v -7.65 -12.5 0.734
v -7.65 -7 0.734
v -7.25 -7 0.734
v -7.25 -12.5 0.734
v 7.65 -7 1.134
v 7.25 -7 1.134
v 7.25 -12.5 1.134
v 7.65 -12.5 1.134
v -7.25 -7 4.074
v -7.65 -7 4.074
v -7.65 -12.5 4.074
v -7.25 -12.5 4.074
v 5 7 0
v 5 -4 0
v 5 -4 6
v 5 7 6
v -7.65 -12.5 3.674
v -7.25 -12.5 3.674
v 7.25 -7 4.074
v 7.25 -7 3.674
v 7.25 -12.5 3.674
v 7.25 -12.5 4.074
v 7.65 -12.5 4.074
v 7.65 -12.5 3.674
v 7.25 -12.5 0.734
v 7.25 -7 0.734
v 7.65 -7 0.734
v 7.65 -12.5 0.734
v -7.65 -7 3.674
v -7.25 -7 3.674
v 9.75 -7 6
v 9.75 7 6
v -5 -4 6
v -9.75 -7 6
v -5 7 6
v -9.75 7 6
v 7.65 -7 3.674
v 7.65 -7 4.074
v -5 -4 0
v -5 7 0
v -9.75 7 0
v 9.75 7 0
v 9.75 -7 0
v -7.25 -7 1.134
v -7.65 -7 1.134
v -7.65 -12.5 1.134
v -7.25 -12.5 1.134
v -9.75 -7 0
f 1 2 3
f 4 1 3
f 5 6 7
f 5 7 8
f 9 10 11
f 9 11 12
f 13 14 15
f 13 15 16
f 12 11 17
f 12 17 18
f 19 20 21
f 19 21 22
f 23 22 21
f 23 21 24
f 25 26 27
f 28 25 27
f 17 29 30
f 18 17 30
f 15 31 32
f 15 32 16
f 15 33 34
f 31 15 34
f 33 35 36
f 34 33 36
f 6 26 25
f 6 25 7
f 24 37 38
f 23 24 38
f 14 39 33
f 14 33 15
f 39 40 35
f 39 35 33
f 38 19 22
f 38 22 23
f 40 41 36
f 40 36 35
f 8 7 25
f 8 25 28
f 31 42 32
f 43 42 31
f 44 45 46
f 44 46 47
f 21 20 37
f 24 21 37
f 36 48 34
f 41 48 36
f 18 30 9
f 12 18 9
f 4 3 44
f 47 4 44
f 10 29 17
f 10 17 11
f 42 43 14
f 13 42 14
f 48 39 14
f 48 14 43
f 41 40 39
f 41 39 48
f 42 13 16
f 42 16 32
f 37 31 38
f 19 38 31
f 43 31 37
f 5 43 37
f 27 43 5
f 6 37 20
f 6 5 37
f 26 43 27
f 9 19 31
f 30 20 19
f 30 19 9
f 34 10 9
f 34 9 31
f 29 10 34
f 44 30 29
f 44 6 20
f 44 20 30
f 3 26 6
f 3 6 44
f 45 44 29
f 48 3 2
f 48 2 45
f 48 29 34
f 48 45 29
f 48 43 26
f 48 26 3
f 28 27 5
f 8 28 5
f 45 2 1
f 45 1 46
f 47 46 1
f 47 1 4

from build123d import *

# Parameters (mm, degrees)
BOSS_EXTRUDE1_DEPTH = 6
SKETCH2_W           = 0.4
SKETCH2_H           = 0.4
BOSS_EXTRUDE2_DEPTH = 5.5


with BuildPart() as part:
    # Sketch1 → Boss-Extrude1 (new body)
    with BuildSketch(Plane.XY):
        Polygon((-5, 7), (-5, -4), (5, -4), (5, 7), (9.75, 7), (9.75, -7), (-9.75, -7), (-9.75, 7), align=None)
    extrude(amount=BOSS_EXTRUDE1_DEPTH)

    # Sketch2 → Boss-Extrude2 (add)
    with BuildSketch(Plane.XZ.offset(7)):
        with Locations((-7.45, 3.874333009)):
            Rectangle(SKETCH2_W, SKETCH2_H)
        with Locations((7.45, 3.874333009)):
            Rectangle(SKETCH2_W, SKETCH2_H)
        with Locations((7.45, 0.934333009)):
            Rectangle(SKETCH2_W, SKETCH2_H)
        with Locations((-7.45, 0.934333009)):
            Rectangle(SKETCH2_W, SKETCH2_H)
    extrude(amount=BOSS_EXTRUDE2_DEPTH)


solid = part.part
